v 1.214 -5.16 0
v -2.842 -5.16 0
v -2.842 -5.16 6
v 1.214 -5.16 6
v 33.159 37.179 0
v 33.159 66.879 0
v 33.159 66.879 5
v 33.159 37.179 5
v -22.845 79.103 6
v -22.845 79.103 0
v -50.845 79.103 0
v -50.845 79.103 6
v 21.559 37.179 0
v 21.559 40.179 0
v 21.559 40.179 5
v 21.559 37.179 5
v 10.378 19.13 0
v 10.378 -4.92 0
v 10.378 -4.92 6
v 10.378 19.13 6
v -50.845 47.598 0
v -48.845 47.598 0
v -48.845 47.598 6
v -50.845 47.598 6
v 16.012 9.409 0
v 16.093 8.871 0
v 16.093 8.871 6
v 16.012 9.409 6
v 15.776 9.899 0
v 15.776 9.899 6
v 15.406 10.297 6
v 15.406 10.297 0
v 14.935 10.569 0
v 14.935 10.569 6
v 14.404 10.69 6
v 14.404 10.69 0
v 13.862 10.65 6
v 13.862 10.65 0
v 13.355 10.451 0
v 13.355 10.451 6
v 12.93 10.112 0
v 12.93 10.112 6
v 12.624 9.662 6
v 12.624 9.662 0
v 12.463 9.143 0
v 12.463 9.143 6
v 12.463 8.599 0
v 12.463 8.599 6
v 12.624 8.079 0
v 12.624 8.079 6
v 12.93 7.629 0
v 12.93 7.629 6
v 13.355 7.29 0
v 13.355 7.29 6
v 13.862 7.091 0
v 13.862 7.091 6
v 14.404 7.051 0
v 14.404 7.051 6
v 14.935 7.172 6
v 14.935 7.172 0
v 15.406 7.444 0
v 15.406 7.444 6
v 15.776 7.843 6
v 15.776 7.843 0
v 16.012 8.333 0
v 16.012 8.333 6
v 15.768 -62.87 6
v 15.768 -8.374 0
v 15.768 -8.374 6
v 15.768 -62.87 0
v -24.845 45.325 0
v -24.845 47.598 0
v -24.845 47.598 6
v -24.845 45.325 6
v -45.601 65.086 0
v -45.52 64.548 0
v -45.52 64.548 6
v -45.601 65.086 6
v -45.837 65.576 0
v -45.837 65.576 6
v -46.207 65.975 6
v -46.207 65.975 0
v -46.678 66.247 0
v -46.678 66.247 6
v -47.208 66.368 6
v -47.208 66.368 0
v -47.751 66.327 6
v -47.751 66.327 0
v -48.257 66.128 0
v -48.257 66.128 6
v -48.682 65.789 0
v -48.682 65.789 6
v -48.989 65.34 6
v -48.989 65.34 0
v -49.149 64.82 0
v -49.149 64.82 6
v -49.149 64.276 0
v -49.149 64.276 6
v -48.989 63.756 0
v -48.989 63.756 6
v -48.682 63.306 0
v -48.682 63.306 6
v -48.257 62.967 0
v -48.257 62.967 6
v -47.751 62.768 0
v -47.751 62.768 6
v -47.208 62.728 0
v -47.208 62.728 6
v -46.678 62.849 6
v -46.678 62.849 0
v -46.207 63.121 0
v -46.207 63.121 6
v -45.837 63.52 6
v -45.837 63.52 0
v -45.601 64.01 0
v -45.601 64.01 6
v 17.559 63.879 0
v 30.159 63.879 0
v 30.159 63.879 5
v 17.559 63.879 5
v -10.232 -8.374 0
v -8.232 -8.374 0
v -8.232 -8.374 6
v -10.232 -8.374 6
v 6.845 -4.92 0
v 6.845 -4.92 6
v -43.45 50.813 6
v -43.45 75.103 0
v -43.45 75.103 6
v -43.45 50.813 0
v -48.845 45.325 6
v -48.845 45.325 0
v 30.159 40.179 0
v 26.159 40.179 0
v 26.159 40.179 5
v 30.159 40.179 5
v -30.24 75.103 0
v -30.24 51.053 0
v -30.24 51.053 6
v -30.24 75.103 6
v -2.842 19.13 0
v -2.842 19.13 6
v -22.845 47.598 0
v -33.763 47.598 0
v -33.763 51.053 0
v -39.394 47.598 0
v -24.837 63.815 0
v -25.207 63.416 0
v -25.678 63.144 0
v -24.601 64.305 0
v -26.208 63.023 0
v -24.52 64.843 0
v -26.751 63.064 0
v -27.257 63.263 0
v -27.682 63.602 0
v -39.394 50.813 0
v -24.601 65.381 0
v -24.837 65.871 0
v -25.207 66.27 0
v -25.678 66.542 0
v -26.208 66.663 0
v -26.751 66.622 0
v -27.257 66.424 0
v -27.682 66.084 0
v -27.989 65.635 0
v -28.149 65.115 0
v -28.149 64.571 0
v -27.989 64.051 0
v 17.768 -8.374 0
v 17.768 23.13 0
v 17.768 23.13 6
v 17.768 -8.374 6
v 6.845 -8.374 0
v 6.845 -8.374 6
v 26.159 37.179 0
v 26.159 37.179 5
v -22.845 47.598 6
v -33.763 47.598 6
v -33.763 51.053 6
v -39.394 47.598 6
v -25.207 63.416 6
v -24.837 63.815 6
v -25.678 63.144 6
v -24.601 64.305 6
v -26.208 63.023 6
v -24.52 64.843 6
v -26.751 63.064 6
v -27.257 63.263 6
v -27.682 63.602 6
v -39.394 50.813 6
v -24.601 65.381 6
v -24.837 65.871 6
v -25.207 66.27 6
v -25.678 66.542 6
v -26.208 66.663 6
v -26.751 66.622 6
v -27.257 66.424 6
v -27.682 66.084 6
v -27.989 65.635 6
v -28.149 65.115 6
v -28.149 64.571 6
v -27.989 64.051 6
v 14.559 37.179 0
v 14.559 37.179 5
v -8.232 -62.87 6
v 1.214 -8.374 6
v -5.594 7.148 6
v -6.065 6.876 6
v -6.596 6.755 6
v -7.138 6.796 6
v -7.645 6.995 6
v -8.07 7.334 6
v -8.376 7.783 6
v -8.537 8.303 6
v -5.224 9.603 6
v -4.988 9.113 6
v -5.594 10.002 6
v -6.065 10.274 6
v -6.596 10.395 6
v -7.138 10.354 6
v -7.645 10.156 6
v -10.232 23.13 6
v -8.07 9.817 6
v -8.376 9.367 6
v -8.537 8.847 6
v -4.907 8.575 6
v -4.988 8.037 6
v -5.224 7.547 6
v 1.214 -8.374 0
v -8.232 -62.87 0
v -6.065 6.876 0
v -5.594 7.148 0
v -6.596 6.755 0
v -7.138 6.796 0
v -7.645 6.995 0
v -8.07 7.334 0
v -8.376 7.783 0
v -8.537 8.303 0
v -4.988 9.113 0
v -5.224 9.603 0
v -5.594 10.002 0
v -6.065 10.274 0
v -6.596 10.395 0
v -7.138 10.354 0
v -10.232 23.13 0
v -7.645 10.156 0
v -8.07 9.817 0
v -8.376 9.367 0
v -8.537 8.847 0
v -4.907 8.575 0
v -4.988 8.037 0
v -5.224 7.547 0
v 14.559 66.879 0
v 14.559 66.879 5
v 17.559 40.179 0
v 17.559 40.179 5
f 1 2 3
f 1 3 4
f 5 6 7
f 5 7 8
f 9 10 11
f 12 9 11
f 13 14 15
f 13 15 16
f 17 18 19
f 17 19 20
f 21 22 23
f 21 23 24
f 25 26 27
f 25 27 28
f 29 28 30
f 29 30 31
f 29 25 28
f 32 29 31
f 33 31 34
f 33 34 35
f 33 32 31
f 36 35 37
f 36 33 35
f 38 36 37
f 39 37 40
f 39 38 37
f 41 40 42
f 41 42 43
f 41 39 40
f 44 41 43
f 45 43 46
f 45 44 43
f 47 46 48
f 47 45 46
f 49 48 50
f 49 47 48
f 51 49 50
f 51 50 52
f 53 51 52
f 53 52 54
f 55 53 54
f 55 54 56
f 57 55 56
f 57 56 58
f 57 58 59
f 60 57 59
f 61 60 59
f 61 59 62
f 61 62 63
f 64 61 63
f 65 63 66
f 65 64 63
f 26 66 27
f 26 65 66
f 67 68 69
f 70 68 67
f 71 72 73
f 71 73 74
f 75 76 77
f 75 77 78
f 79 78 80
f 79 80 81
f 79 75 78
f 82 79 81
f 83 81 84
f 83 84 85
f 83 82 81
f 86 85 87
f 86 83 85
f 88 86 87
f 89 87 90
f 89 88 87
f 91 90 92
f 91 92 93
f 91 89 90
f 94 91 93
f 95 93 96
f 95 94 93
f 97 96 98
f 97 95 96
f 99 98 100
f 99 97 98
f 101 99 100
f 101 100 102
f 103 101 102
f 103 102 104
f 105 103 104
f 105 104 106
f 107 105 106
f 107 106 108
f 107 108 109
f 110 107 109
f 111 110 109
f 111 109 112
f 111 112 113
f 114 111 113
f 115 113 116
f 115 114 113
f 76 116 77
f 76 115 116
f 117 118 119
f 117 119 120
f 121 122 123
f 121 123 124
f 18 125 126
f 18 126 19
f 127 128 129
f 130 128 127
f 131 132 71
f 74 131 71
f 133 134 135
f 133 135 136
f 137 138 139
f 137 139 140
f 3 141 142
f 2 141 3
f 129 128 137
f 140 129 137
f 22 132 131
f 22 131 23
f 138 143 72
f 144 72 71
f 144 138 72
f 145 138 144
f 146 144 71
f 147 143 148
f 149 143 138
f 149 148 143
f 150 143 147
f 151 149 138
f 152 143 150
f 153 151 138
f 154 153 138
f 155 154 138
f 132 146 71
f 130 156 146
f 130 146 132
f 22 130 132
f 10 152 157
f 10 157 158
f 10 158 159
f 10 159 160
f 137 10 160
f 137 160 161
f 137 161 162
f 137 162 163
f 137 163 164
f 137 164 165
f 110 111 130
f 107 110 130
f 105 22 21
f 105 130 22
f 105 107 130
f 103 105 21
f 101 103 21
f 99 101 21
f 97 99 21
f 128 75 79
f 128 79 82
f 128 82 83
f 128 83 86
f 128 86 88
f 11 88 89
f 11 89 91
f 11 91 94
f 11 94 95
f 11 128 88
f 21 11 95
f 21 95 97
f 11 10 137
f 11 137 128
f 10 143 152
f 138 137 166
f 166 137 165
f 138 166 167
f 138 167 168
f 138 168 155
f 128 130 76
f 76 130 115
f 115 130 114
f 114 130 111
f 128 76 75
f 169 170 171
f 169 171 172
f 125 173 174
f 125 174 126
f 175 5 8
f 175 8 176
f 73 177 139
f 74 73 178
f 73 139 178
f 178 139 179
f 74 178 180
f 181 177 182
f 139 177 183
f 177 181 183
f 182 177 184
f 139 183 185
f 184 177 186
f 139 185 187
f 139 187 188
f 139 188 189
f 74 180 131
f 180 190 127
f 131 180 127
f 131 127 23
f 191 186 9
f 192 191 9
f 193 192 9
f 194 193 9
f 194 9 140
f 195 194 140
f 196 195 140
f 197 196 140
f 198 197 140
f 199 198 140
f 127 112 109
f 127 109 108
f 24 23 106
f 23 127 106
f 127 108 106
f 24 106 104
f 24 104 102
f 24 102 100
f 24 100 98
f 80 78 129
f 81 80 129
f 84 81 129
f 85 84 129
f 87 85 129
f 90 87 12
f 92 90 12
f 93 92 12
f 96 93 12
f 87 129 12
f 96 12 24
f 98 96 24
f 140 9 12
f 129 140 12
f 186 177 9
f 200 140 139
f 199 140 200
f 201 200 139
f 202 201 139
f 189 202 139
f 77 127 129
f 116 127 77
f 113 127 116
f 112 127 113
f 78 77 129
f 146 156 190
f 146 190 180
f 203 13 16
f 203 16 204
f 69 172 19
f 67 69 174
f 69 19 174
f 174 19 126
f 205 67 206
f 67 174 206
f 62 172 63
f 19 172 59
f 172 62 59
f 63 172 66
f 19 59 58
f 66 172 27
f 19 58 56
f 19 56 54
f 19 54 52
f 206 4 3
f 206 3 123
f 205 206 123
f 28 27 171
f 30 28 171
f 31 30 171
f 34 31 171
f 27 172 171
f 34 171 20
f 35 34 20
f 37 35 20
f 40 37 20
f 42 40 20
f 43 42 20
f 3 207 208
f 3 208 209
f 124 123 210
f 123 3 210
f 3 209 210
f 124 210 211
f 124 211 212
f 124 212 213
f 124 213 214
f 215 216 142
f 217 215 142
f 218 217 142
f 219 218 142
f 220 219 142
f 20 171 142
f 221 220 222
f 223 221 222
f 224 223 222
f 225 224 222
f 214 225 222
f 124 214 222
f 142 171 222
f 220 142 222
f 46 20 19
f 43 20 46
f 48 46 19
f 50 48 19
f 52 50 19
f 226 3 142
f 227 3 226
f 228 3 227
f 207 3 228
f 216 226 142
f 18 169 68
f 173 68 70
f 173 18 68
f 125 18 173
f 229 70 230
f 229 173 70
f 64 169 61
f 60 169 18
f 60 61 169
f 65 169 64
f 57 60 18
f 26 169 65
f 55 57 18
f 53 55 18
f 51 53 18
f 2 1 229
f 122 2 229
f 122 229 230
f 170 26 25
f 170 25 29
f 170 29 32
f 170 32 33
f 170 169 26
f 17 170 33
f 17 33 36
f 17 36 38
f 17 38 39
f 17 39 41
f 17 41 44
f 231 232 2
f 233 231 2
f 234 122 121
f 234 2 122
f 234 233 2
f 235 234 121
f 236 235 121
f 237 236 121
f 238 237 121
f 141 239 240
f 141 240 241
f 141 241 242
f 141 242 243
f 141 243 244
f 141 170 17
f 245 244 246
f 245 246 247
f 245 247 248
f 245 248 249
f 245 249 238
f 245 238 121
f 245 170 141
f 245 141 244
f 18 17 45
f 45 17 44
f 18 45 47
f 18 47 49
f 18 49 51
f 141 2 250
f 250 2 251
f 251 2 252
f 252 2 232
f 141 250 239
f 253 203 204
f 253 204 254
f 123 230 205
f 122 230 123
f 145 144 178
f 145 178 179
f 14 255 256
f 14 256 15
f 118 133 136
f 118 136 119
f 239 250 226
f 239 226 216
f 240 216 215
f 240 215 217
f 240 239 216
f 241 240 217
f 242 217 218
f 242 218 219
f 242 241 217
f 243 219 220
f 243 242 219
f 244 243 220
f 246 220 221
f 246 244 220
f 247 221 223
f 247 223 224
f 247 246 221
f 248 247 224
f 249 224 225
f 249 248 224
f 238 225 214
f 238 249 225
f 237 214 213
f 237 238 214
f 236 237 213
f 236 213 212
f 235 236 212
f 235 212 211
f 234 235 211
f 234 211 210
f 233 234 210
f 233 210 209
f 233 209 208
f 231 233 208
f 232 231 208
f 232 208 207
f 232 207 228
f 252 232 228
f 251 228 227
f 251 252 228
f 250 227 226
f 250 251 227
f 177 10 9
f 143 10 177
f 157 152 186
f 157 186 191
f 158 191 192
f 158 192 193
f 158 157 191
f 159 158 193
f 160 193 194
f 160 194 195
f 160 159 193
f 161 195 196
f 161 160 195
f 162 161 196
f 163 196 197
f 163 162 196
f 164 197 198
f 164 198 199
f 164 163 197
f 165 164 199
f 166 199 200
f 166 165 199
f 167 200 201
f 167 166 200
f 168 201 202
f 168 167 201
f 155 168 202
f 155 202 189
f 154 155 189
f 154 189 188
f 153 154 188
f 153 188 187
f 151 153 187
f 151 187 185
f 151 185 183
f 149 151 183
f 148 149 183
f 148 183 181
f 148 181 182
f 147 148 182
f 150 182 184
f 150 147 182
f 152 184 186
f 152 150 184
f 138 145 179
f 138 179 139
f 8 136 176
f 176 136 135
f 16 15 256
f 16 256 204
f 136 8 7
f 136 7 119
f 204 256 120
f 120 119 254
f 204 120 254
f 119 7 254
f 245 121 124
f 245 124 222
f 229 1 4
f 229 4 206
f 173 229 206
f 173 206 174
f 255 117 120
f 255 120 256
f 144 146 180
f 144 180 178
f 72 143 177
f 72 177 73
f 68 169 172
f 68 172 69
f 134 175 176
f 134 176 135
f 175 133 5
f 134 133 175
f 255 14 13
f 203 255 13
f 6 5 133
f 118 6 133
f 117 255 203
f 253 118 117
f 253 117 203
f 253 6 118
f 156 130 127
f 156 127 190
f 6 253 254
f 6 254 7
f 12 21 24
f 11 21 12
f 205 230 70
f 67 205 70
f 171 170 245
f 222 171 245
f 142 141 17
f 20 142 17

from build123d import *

# Parameters (mm, degrees)
SKETCH1_R           = 1.825
BOSS_EXTRUDE1_DEPTH = 6
SKETCH3_R           = 1.825
BOSS_EXTRUDE2_DEPTH = 6
BOSS_EXTRUDE3_DEPTH = 5


with BuildPart() as part:
    # Sketch1 → Boss-Extrude1 (new body)
    with BuildSketch(Plane.XY):
        Polygon((3.767928447, -62.86956086), (-8.232071553, -62.86956086), (-8.232071553, -8.37428403), (-10.232071553, -8.37428403), (-10.232071553, 23.13043914), (-8.232071553, 23.13043914), (3.767928447, 23.13043914), (15.767928447, 23.13043914), (17.767928447, 23.13043914), (17.767928447, -8.37428403), (15.767928447, -8.37428403), (15.767928447, -62.86956086), align=None)
        with Locations((-6.732071553, 8.575211091)):
            Circle(SKETCH1_R, mode=Mode.SUBTRACT)
        with Locations((14.267928447, 8.870590402)):
            Circle(SKETCH1_R, mode=Mode.SUBTRACT)
        Polygon((3.767928447, 19.13043914), (-2.842071553, 19.13043914), (-2.842071553, -5.15956086), (1.21363058, -5.15956086), (1.21363058, -8.37428403), (6.844888712, -8.37428403), (6.844888712, -4.91956086), (10.377928447, -4.91956086), (10.377928447, 19.13043914), align=None, mode=Mode.SUBTRACT)
    extrude(amount=BOSS_EXTRUDE1_DEPTH)


with BuildPart() as body_2:
    # Sketch3 → Boss-Extrude2 (new body)
    with BuildSketch(Plane.XY):
        Polygon((-36.844661852, 45.324982103), (-48.844661852, 45.324982103), (-48.844661852, 47.59819619), (-50.844661852, 47.59819619), (-50.844661852, 79.10291936), (-48.844661852, 79.10291936), (-36.844661852, 79.10291936), (-24.844661852, 79.10291936), (-22.844661852, 79.10291936), (-22.844661852, 47.59819619), (-24.844661852, 47.59819619), (-24.844661852, 45.324982103), align=None)
        with Locations((-47.344661852, 64.547691311)):
            Circle(SKETCH3_R, mode=Mode.SUBTRACT)
        with Locations((-26.344661852, 64.843070622)):
            Circle(SKETCH3_R, mode=Mode.SUBTRACT)
        Polygon((-36.844661852, 75.10291936), (-43.449661852, 75.10291936), (-43.449661852, 50.81291936), (-39.393959719, 50.81291936), (-39.393959719, 47.59819619), (-33.762701587, 47.59819619), (-33.762701587, 51.05291936), (-30.239661852, 51.05291936), (-30.239661852, 75.10291936), align=None, mode=Mode.SUBTRACT)
    extrude(amount=BOSS_EXTRUDE2_DEPTH)


with BuildPart() as body_3:
    # Sketch4 → Boss-Extrude3 (new body)
    with BuildSketch(Plane.XY):
        Polygon((14.559138473, 66.878973496), (33.159138473, 66.878973496), (33.159138473, 37.178973496), (26.159138473, 37.178973496), (26.159138473, 40.178973496), (30.159138473, 40.178973496), (30.159138473, 63.878973496), (17.559138473, 63.878973496), (17.559138473, 40.178973496), (21.559138473, 40.178973496), (21.559138473, 37.178973496), (14.559138473, 37.178973496), align=None)
    extrude(amount=BOSS_EXTRUDE3_DEPTH)


solid = Compound([part.part, body_2.part, body_3.part])
